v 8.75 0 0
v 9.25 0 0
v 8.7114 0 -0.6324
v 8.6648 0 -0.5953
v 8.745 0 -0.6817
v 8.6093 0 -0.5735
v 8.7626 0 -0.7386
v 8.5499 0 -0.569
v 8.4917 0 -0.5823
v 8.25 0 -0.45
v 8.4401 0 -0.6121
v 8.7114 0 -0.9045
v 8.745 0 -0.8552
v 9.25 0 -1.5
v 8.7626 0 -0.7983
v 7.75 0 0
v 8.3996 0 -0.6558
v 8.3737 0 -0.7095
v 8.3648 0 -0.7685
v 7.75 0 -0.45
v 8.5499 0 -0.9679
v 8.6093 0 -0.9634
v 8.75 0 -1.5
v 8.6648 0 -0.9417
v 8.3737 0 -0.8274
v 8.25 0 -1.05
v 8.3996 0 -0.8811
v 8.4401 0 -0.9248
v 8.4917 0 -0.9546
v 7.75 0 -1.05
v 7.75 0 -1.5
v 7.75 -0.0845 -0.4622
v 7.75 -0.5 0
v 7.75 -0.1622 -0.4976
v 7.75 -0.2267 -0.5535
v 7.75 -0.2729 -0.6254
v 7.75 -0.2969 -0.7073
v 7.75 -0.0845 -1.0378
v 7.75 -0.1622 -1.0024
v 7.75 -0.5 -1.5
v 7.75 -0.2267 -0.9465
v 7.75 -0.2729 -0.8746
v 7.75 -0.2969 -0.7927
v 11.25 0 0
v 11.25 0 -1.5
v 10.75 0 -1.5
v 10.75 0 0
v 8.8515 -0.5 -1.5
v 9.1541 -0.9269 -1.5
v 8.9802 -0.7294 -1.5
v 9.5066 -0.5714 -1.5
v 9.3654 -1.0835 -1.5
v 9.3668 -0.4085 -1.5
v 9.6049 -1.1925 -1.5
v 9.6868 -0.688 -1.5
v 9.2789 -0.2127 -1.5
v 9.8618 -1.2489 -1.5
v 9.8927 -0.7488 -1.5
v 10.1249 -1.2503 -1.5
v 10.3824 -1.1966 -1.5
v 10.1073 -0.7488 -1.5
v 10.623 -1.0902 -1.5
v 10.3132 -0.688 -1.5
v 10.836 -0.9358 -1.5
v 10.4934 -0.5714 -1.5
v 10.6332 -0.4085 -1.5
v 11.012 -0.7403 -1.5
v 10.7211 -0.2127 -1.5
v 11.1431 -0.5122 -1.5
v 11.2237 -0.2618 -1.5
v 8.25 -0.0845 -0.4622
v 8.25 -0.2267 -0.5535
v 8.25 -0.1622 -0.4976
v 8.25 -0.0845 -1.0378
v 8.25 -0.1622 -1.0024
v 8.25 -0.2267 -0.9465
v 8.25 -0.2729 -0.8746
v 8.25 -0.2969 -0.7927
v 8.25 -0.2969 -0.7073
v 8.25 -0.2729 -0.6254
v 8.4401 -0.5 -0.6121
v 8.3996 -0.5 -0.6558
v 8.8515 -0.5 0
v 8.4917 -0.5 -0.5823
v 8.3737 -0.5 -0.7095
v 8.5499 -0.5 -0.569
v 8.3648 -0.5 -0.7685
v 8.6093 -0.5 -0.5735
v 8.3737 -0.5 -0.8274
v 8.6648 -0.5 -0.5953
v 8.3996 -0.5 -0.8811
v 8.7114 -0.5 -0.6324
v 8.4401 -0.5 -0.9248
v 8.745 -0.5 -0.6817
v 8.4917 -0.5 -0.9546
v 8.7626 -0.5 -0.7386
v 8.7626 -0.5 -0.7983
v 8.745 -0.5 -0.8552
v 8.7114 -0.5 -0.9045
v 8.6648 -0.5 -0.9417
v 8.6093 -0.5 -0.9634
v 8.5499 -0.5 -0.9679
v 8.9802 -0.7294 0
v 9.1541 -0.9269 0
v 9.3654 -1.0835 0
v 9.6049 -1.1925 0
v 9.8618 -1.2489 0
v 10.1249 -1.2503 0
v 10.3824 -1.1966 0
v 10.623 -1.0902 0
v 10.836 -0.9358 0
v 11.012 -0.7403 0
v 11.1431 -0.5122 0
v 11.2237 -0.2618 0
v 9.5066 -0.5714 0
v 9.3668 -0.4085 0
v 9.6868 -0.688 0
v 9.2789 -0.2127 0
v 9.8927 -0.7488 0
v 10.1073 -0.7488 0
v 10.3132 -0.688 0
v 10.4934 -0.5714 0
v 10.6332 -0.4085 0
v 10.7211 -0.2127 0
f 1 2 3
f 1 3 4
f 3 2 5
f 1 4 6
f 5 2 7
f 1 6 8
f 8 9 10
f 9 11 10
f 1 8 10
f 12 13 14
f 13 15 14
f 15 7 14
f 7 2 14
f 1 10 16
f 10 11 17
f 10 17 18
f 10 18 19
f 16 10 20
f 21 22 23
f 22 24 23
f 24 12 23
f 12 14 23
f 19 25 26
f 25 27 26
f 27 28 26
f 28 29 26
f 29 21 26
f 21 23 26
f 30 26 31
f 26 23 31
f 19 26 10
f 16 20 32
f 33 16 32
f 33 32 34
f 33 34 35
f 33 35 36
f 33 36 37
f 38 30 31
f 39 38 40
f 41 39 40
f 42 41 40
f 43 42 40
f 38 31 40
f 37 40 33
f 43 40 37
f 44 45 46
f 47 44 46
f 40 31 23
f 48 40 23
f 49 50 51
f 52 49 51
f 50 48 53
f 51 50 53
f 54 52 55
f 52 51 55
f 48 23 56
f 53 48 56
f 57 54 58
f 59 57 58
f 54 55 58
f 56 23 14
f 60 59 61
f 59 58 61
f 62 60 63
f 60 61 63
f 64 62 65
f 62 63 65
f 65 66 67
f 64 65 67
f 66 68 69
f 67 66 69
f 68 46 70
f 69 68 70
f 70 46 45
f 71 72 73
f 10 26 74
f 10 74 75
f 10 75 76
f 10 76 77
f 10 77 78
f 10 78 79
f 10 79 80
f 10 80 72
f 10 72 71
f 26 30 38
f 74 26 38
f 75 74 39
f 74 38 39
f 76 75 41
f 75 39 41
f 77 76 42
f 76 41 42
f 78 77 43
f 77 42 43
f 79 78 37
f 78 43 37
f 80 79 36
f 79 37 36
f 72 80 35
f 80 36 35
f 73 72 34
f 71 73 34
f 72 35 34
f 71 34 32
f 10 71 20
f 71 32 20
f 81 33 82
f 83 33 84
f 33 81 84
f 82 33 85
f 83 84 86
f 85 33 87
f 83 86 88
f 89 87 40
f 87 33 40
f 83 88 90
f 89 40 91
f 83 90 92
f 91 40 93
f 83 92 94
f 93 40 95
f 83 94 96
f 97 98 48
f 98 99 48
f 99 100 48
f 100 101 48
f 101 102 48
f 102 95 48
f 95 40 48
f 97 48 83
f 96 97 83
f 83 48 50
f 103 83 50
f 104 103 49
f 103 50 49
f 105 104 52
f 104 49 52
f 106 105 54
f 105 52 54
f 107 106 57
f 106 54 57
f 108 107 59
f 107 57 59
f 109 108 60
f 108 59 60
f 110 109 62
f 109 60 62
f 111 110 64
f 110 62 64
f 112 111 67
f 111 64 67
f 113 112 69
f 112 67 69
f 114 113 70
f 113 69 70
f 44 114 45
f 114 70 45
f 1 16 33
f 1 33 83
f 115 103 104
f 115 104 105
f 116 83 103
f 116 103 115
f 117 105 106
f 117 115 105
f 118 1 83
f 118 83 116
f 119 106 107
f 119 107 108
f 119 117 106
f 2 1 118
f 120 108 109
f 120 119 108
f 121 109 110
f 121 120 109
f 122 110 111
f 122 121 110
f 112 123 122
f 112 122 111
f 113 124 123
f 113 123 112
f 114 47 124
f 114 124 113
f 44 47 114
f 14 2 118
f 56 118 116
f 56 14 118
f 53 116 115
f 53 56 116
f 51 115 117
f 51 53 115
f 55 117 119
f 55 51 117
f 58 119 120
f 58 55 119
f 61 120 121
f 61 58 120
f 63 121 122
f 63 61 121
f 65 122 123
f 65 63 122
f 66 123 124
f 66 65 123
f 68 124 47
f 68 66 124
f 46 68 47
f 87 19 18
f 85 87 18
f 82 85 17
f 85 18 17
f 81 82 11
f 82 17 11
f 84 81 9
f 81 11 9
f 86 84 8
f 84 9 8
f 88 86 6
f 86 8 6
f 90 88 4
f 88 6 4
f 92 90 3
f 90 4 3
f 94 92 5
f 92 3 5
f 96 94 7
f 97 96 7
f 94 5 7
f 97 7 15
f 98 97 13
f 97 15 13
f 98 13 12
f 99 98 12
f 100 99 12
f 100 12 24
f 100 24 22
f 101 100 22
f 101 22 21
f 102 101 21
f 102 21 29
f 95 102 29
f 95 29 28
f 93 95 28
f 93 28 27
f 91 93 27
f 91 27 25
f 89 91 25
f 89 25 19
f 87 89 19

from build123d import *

# Parameters (mm, degrees)
EXTRUDE_START       = -1.5
EXTRUDE_1_OUTLINE_R = 0.75
EXTRUDE_1_DEPTH     = 1.5
SKETCH_3_R          = 0.3
CUT_EXTRUDE_1_DEPTH = 0.5
SKETCH_4_R          = 0.2
CUT_EXTRUDE_2_DEPTH = 0.5
SKETCH_5_W          = 3.047212849
SKETCH_5_H          = 1.728243789
CUT_EXTRUDE_3_DEPTH = 3.12


# Read off the part's stored shape, not the designer's step: 凸台-拉伸1
with BuildPart() as part:
    # 凸台-拉伸1 outline → 凸台-拉伸1 (new body)
    with BuildSketch(Plane.XY.offset(EXTRUDE_START)):
        with BuildLine():
            Line((7.75, 0), (7.75, -0.5))
            Line((7.75, -0.5), (8.851510108, -0.5))
            ThreePointArc((8.851510108, -0.5), (11.224999287, 0.242146363), (8.750004894, 0))
            Line((8.750004894, 0), (7.75, 0))
        make_face()
        with Locations((9.999987765, -0.006543751)):
            Circle(EXTRUDE_1_OUTLINE_R, mode=Mode.SUBTRACT)
    extrude(amount=EXTRUDE_1_DEPTH)

    # 草图3 → 切除-拉伸1 (cut)
    with BuildSketch(Plane.ZY.offset(-7.75)):
        with Locations((-0.75, 0)):
            Circle(SKETCH_3_R)
    extrude(amount=-CUT_EXTRUDE_1_DEPTH, mode=Mode.SUBTRACT)

    # 草图4 → 切除-拉伸2 (cut)
    with BuildSketch(Plane(origin=(0, 0, 0), x_dir=(1, 0, 0), z_dir=(0, 1, 0))):
        with Locations(Location((8.564809318, 0.768458185, 0), (0, 0, 180))):
            Circle(SKETCH_4_R)
    extrude(amount=-CUT_EXTRUDE_2_DEPTH, mode=Mode.SUBTRACT)

    # 草图5 → 切除-拉伸3 (cut)
    with BuildSketch(Plane(origin=(0, 0, -1.5), x_dir=(-1, 0, 0), z_dir=(0, 0, -1))):
        with Locations((-10.273611319, 0.864121895)):
            Rectangle(SKETCH_5_W, SKETCH_5_H)
    extrude(amount=-CUT_EXTRUDE_3_DEPTH, mode=Mode.SUBTRACT)


solid = part.part
